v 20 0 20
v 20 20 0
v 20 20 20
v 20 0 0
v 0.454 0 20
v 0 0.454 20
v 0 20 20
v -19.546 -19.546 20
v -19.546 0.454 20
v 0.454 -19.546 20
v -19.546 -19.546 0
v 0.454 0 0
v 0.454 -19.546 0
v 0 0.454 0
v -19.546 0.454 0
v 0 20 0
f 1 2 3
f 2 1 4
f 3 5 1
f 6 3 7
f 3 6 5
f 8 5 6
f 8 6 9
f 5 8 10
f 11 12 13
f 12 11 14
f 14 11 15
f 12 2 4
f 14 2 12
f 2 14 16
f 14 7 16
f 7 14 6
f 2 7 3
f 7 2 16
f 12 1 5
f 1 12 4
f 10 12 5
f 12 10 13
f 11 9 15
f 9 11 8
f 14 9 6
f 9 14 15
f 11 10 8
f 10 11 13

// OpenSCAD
w=20;
twt=.454;

//complete failure
module naive(){
    cube(w);
    rotate([0,0,180])
        cube(w);
}

module overlap(p=1){
    cube(w);
    translate([twt*p-w,twt*p-w,0])
        cube(w);
}

overlap();
